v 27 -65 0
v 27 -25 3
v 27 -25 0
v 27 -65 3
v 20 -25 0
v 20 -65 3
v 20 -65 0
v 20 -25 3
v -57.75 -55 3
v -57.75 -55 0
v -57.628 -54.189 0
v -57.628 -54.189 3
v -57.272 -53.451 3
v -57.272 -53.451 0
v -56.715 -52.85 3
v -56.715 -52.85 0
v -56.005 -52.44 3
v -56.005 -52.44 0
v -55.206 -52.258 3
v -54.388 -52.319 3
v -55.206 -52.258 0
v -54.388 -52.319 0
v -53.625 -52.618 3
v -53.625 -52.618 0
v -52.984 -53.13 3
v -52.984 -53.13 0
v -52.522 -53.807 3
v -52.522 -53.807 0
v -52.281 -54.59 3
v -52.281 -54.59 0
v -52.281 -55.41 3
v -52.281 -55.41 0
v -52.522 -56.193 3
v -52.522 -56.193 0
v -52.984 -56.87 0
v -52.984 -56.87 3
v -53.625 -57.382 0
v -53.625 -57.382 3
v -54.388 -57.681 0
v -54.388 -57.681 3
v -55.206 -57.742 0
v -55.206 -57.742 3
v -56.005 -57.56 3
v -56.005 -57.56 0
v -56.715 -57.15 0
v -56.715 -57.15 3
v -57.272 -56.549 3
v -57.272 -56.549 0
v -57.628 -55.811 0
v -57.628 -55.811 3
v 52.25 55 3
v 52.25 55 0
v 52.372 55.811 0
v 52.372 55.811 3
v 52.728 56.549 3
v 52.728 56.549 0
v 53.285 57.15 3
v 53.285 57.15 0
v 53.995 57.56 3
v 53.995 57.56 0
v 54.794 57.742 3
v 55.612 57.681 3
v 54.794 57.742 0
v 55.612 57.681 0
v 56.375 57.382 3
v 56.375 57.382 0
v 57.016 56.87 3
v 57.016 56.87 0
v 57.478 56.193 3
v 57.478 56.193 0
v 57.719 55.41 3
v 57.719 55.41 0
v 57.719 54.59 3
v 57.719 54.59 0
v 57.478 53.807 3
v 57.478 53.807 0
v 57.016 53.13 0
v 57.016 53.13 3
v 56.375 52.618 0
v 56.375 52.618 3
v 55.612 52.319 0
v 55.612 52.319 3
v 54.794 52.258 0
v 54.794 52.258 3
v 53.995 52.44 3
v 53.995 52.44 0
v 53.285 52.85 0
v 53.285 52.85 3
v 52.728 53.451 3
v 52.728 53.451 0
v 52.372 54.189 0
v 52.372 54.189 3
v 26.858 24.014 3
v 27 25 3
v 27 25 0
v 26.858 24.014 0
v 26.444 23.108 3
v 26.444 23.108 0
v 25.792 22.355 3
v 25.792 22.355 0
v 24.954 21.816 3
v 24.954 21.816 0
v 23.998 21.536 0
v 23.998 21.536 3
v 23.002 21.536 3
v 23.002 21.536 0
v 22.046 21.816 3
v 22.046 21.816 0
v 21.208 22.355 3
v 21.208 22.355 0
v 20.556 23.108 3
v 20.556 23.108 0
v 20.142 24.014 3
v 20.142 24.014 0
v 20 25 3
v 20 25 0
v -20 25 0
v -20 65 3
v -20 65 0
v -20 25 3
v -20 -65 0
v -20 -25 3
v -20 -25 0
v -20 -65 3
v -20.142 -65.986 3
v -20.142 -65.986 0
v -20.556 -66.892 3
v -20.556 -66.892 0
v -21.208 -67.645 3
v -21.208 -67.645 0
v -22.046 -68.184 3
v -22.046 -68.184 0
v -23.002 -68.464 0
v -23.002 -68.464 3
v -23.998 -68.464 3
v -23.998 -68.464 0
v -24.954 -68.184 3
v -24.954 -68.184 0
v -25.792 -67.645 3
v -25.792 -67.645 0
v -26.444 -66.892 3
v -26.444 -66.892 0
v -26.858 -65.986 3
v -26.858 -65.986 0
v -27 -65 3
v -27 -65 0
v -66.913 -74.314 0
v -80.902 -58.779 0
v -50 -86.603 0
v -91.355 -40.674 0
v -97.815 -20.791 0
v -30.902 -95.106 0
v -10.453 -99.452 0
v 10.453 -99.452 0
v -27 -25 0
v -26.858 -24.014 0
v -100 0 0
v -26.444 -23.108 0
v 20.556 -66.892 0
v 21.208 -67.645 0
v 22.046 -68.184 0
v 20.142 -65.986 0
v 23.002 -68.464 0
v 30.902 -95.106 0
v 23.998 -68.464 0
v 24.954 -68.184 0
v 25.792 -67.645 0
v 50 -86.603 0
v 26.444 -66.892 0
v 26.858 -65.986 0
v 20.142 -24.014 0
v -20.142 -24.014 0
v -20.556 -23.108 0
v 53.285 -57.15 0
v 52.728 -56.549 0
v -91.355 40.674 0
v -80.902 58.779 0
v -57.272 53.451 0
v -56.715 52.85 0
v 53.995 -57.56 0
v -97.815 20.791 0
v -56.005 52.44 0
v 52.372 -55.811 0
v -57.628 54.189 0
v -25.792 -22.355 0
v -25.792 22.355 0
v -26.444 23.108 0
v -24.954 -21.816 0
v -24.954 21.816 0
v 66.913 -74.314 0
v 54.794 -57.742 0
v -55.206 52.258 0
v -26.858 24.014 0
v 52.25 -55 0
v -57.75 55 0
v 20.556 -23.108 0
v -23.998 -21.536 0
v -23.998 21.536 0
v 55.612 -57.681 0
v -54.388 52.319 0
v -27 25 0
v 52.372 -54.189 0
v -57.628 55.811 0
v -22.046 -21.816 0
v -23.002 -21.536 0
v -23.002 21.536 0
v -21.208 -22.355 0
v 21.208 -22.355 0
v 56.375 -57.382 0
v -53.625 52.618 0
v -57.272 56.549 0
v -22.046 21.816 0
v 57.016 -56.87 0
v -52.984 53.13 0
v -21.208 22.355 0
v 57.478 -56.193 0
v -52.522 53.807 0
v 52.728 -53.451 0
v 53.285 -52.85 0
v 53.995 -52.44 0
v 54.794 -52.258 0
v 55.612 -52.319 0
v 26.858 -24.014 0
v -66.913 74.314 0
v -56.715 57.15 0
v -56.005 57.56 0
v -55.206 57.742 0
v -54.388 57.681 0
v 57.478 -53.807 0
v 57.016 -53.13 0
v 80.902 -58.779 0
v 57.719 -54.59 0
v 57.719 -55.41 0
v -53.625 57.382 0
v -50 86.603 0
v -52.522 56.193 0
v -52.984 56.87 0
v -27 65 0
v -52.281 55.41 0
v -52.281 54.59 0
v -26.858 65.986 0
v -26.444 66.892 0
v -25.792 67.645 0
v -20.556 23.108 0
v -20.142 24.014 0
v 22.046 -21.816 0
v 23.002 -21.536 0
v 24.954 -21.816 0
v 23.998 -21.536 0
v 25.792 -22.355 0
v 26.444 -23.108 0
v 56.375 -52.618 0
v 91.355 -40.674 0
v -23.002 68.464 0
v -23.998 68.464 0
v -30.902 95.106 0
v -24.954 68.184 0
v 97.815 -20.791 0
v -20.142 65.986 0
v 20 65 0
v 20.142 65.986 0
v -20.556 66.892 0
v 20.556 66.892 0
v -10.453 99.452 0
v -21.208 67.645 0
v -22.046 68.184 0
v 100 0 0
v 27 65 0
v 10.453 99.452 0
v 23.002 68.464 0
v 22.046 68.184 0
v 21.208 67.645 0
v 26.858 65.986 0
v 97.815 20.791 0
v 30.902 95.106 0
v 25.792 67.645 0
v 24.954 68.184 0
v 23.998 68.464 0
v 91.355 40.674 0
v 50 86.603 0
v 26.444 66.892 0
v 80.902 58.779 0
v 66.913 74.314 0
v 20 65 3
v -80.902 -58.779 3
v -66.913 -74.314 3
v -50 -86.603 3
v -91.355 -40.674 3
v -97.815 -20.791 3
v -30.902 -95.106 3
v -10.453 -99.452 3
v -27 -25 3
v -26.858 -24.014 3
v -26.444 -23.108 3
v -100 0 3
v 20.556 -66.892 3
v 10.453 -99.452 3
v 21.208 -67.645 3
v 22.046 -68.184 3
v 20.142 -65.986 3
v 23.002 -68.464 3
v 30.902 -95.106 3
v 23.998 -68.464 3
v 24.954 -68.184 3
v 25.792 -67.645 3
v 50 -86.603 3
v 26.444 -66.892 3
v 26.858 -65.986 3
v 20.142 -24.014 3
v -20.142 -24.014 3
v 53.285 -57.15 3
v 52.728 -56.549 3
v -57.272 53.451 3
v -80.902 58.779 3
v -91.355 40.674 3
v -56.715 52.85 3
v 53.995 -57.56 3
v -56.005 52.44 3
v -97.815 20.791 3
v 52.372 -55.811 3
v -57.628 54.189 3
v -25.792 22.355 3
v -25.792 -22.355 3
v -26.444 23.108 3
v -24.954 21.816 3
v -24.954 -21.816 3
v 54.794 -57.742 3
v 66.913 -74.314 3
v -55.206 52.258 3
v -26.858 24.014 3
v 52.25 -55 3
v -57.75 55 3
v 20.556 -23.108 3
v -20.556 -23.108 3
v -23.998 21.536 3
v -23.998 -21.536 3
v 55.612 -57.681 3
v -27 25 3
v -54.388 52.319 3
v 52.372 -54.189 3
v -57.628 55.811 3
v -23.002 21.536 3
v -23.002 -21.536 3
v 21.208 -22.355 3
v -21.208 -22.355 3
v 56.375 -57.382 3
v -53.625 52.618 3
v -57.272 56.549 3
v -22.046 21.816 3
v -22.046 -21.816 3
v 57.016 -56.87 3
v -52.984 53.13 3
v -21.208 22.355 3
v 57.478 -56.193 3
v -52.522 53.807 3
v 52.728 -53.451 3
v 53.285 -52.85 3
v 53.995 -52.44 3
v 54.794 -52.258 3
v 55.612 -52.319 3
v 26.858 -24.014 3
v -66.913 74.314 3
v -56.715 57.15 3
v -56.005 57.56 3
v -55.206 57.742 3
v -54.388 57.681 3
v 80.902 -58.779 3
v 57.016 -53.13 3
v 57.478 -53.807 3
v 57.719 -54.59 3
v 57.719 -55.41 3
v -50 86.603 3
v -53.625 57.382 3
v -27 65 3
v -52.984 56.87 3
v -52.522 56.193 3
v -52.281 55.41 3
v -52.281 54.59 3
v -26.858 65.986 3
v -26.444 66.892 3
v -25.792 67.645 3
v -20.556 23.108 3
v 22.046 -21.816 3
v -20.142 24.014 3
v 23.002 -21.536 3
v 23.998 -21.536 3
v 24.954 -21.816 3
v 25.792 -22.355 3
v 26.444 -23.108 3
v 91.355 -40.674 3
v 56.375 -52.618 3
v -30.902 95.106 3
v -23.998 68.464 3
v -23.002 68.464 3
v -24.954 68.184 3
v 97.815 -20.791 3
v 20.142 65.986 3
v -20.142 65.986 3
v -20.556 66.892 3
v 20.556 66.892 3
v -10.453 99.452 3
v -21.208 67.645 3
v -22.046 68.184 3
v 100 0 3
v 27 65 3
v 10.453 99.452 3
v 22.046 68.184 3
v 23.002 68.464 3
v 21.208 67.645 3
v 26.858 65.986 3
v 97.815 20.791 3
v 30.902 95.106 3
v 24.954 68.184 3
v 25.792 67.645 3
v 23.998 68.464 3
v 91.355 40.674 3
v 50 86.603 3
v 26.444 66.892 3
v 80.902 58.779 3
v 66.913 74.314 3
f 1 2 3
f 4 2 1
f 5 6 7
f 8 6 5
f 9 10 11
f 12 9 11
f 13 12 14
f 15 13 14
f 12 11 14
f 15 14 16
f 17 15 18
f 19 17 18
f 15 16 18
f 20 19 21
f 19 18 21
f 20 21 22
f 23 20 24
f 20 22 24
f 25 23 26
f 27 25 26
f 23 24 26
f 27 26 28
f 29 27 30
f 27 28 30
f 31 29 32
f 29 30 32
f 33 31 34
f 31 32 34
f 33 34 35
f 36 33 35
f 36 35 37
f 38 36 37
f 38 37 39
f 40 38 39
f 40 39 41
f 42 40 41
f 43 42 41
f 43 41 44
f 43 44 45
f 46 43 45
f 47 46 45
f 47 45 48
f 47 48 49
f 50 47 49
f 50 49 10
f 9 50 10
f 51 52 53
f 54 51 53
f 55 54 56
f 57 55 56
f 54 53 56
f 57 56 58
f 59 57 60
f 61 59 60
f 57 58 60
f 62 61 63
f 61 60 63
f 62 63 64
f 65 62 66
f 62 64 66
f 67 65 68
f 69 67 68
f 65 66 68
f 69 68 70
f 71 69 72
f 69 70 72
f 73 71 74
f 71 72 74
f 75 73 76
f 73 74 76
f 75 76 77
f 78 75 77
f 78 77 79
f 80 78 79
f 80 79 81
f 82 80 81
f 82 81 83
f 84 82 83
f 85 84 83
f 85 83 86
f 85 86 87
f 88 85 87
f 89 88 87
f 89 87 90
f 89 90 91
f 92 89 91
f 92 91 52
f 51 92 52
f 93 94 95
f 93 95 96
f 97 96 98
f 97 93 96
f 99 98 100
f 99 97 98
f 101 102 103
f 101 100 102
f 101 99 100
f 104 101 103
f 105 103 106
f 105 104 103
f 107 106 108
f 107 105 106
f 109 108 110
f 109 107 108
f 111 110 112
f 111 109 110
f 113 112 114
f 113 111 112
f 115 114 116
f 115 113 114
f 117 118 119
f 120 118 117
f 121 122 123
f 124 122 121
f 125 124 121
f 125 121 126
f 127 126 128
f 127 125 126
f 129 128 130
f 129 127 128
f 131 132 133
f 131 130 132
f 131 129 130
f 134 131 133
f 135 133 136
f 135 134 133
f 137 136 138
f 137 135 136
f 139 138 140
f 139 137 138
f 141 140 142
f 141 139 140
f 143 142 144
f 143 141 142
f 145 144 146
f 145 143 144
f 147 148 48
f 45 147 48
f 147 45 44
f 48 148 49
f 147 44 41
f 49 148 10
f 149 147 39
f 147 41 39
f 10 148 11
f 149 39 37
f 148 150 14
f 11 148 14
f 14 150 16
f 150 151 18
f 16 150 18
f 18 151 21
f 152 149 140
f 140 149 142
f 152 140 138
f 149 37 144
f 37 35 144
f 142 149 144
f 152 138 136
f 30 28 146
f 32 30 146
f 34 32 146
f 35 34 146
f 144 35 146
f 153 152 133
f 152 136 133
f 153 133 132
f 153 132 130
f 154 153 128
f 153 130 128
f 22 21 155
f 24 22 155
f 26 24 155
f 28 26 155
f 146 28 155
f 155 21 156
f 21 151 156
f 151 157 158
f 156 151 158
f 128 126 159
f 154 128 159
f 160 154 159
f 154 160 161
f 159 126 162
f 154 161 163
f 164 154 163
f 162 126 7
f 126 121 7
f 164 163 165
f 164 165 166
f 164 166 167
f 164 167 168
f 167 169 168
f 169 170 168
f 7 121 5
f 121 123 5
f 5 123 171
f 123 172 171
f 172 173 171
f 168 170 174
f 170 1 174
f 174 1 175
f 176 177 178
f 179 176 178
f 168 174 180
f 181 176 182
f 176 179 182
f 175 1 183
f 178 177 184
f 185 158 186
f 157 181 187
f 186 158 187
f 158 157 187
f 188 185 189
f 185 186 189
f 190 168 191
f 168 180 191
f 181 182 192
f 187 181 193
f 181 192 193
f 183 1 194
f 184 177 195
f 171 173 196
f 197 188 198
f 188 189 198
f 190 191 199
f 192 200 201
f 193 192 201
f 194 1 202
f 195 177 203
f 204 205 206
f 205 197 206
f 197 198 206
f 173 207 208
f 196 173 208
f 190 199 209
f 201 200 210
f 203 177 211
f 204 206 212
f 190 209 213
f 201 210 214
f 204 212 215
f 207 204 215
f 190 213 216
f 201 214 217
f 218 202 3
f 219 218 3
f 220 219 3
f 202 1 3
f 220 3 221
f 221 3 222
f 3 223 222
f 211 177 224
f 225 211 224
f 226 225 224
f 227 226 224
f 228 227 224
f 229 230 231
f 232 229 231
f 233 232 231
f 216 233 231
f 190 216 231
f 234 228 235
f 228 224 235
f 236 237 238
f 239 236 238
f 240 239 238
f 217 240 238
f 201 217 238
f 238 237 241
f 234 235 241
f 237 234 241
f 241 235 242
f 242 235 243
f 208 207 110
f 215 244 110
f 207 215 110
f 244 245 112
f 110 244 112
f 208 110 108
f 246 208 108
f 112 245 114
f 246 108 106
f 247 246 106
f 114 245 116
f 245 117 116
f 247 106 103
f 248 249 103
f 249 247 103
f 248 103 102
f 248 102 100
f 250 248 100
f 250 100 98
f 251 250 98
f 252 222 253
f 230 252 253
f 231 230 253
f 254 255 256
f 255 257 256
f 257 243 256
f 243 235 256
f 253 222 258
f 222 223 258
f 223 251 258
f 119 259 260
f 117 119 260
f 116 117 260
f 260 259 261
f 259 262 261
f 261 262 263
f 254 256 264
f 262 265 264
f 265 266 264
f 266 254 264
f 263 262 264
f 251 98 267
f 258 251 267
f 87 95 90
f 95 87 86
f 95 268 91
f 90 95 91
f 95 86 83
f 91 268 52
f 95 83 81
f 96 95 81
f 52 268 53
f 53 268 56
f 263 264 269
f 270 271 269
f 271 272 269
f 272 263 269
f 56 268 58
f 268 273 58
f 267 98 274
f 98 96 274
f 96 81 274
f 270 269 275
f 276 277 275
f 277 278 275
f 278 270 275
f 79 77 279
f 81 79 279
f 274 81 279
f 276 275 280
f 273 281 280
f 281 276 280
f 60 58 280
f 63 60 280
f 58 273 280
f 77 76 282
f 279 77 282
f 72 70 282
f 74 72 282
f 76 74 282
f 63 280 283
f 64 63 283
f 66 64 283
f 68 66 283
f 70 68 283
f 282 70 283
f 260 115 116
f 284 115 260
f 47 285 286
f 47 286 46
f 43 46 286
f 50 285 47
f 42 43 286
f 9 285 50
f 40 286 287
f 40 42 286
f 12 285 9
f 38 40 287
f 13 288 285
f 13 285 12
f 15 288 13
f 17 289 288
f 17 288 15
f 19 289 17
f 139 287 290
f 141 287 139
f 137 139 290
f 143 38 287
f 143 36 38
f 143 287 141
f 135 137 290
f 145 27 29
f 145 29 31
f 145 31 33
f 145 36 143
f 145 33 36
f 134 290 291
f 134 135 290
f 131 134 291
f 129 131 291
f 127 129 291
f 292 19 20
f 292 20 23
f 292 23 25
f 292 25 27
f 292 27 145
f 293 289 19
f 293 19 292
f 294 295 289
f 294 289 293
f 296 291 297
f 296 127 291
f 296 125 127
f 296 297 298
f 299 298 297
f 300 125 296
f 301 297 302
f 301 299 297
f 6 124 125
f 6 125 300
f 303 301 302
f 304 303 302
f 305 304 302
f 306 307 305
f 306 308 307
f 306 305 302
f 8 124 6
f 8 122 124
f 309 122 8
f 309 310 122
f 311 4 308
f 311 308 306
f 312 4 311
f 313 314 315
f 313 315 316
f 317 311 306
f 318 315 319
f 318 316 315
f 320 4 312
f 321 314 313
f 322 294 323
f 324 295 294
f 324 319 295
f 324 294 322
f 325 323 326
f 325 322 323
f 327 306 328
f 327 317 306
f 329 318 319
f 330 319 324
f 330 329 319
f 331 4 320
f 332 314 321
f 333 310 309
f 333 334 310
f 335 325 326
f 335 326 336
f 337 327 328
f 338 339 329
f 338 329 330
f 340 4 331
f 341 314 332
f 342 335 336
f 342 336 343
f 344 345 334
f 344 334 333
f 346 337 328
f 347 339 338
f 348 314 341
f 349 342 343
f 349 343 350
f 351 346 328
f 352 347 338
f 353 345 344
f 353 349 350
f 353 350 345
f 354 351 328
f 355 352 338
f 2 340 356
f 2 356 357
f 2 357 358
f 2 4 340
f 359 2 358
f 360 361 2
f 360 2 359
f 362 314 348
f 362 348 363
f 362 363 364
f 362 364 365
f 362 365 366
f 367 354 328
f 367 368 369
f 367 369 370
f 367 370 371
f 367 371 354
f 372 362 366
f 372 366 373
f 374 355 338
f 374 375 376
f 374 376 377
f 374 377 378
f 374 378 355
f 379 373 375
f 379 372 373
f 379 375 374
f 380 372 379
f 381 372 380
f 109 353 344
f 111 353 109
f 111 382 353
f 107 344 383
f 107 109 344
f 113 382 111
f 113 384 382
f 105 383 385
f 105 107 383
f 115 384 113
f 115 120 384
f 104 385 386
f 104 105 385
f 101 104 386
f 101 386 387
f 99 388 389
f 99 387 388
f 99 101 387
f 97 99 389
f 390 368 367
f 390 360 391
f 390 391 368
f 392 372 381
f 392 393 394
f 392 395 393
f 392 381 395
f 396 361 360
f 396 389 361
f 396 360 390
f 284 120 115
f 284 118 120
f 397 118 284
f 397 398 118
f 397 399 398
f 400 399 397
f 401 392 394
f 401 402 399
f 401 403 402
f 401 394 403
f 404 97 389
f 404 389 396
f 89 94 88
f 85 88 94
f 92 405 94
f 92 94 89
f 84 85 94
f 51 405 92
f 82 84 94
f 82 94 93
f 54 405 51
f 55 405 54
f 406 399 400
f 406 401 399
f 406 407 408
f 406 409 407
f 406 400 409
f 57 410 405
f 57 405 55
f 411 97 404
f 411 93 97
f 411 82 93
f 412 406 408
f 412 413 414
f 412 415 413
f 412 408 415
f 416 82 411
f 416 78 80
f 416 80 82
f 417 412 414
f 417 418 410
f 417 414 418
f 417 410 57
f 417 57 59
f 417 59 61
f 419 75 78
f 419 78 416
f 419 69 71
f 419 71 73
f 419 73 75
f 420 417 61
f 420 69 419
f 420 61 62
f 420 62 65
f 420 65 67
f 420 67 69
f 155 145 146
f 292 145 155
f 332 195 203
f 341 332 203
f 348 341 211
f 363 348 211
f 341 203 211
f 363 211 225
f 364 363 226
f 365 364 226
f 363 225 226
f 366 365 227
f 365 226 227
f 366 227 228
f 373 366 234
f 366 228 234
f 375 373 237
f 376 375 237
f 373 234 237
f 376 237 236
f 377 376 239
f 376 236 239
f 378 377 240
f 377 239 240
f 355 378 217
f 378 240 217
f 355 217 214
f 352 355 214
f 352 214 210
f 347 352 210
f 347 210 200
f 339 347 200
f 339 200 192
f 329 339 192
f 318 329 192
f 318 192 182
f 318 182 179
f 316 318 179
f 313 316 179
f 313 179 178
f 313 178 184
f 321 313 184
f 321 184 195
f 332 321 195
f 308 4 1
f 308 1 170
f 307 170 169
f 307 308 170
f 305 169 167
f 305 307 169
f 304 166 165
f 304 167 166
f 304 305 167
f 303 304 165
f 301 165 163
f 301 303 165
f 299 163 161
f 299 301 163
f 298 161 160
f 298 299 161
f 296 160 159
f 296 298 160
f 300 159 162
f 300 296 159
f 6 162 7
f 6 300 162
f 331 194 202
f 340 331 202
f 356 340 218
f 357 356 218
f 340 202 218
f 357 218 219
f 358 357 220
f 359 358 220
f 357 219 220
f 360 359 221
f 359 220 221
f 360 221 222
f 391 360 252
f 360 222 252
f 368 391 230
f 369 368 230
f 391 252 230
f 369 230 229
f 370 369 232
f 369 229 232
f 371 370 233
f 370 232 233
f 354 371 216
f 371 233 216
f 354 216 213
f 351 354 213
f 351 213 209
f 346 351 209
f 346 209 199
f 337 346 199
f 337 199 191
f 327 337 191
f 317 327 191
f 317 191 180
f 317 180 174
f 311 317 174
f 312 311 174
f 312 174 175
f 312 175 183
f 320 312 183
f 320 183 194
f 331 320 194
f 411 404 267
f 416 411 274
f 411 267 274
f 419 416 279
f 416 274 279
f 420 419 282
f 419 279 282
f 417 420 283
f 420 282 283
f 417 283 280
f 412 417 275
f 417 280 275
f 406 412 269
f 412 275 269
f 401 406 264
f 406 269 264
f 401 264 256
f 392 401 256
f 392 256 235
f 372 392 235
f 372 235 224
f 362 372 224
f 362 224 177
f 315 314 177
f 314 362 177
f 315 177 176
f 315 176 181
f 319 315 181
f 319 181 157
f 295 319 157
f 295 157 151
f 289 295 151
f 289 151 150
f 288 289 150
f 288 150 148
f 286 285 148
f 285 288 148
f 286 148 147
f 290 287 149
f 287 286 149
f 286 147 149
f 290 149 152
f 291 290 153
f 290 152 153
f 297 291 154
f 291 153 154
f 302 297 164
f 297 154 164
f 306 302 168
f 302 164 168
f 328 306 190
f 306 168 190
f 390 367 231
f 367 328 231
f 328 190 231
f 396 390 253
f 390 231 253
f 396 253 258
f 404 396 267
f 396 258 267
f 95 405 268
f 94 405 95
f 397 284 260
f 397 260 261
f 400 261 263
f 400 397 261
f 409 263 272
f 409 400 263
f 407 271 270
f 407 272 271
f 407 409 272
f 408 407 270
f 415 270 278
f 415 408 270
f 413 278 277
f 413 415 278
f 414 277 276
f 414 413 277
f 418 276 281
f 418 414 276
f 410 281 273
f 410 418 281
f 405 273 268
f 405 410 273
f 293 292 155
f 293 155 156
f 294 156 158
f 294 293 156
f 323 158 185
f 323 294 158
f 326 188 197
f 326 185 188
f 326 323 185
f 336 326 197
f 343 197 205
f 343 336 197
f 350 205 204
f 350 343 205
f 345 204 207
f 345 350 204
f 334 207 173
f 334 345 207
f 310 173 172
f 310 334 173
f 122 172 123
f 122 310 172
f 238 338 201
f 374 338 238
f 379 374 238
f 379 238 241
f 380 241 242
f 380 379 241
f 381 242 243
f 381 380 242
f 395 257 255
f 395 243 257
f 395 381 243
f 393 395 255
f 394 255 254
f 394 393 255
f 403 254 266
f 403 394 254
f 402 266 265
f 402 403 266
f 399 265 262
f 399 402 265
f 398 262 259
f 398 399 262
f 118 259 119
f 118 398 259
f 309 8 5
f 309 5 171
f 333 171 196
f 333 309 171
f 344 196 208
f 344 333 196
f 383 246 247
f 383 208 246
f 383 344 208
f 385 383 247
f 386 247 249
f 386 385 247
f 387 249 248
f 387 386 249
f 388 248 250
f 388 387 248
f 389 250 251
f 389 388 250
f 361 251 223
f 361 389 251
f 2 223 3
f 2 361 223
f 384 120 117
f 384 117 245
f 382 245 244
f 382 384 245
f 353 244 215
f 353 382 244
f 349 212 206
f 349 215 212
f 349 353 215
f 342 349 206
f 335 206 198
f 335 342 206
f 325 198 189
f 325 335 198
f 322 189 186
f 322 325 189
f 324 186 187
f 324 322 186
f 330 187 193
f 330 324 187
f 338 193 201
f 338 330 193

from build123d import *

# Parameters (mm, degrees)
IZIM1_R                     = 100
Y_KSEKLIK_EKSTR_ZYON1_DEPTH = 30
KES_EKSTR_ZYON1_DEPTH       = 145.568322948
M5_BO_LUKLU_DELIK2_D        = 5.5
IZIM20_R                    = 183.537558205
KES_EKSTR_ZYON3_DEPTH       = 27


with BuildPart() as part:
    # Çizim1 → Yükseklik-Ekstrüzyon1 (new body)
    with BuildSketch(Plane.XY):
        Circle(IZIM1_R)
    extrude(amount=Y_KSEKLIK_EKSTR_ZYON1_DEPTH)

    # Çizim9 → Kes-Ekstrüzyon1 (cut, through all)
    with BuildSketch(Plane.XY.offset(30)):
        with BuildLine():
            Line((27, 65), (27, 25))
            ThreePointArc((27, 25), (23.5, 21.5), (20, 25))
            Line((20, 25), (20, 65))
            ThreePointArc((20, 65), (23.5, 68.5), (27, 65))
        make_face()
        with BuildLine():
            Line((-20, 65), (-20, 25))
            ThreePointArc((-20, 25), (-23.5, 21.5), (-27, 25))
            Line((-27, 25), (-27, 65))
            ThreePointArc((-27, 65), (-23.5, 68.5), (-20, 65))
        make_face()
        with BuildLine():
            Line((-20, -25), (-20, -65))
            ThreePointArc((-20, -65), (-23.5, -68.5), (-27, -65))
            Line((-27, -65), (-27, -25))
            ThreePointArc((-27, -25), (-23.5, -21.5), (-20, -25))
        make_face()
        with BuildLine():
            Line((20, -65), (20, -25))
            ThreePointArc((20, -25), (23.5, -21.5), (27, -25))
            Line((27, -25), (27, -65))
            ThreePointArc((27, -65), (23.5, -68.5), (20, -65))
        make_face()
    extrude(amount=-KES_EKSTR_ZYON1_DEPTH, mode=Mode.SUBTRACT)

    # M5 Boşluklu Delik2 (through all)
    with Locations(Plane.XY.offset(30)):
        with Locations((-55, 55), (55, 55), (55, -55), (-55, -55)):
            Hole(M5_BO_LUKLU_DELIK2_D / 2)

    # Çizim20 → Kes-Ekstrüzyon3 (cut)
    with BuildSketch(Plane.XY.offset(30)):
        with Locations((0, 8.479468632)):
            Circle(IZIM20_R)
    extrude(amount=-KES_EKSTR_ZYON3_DEPTH, mode=Mode.SUBTRACT)


solid = part.part
